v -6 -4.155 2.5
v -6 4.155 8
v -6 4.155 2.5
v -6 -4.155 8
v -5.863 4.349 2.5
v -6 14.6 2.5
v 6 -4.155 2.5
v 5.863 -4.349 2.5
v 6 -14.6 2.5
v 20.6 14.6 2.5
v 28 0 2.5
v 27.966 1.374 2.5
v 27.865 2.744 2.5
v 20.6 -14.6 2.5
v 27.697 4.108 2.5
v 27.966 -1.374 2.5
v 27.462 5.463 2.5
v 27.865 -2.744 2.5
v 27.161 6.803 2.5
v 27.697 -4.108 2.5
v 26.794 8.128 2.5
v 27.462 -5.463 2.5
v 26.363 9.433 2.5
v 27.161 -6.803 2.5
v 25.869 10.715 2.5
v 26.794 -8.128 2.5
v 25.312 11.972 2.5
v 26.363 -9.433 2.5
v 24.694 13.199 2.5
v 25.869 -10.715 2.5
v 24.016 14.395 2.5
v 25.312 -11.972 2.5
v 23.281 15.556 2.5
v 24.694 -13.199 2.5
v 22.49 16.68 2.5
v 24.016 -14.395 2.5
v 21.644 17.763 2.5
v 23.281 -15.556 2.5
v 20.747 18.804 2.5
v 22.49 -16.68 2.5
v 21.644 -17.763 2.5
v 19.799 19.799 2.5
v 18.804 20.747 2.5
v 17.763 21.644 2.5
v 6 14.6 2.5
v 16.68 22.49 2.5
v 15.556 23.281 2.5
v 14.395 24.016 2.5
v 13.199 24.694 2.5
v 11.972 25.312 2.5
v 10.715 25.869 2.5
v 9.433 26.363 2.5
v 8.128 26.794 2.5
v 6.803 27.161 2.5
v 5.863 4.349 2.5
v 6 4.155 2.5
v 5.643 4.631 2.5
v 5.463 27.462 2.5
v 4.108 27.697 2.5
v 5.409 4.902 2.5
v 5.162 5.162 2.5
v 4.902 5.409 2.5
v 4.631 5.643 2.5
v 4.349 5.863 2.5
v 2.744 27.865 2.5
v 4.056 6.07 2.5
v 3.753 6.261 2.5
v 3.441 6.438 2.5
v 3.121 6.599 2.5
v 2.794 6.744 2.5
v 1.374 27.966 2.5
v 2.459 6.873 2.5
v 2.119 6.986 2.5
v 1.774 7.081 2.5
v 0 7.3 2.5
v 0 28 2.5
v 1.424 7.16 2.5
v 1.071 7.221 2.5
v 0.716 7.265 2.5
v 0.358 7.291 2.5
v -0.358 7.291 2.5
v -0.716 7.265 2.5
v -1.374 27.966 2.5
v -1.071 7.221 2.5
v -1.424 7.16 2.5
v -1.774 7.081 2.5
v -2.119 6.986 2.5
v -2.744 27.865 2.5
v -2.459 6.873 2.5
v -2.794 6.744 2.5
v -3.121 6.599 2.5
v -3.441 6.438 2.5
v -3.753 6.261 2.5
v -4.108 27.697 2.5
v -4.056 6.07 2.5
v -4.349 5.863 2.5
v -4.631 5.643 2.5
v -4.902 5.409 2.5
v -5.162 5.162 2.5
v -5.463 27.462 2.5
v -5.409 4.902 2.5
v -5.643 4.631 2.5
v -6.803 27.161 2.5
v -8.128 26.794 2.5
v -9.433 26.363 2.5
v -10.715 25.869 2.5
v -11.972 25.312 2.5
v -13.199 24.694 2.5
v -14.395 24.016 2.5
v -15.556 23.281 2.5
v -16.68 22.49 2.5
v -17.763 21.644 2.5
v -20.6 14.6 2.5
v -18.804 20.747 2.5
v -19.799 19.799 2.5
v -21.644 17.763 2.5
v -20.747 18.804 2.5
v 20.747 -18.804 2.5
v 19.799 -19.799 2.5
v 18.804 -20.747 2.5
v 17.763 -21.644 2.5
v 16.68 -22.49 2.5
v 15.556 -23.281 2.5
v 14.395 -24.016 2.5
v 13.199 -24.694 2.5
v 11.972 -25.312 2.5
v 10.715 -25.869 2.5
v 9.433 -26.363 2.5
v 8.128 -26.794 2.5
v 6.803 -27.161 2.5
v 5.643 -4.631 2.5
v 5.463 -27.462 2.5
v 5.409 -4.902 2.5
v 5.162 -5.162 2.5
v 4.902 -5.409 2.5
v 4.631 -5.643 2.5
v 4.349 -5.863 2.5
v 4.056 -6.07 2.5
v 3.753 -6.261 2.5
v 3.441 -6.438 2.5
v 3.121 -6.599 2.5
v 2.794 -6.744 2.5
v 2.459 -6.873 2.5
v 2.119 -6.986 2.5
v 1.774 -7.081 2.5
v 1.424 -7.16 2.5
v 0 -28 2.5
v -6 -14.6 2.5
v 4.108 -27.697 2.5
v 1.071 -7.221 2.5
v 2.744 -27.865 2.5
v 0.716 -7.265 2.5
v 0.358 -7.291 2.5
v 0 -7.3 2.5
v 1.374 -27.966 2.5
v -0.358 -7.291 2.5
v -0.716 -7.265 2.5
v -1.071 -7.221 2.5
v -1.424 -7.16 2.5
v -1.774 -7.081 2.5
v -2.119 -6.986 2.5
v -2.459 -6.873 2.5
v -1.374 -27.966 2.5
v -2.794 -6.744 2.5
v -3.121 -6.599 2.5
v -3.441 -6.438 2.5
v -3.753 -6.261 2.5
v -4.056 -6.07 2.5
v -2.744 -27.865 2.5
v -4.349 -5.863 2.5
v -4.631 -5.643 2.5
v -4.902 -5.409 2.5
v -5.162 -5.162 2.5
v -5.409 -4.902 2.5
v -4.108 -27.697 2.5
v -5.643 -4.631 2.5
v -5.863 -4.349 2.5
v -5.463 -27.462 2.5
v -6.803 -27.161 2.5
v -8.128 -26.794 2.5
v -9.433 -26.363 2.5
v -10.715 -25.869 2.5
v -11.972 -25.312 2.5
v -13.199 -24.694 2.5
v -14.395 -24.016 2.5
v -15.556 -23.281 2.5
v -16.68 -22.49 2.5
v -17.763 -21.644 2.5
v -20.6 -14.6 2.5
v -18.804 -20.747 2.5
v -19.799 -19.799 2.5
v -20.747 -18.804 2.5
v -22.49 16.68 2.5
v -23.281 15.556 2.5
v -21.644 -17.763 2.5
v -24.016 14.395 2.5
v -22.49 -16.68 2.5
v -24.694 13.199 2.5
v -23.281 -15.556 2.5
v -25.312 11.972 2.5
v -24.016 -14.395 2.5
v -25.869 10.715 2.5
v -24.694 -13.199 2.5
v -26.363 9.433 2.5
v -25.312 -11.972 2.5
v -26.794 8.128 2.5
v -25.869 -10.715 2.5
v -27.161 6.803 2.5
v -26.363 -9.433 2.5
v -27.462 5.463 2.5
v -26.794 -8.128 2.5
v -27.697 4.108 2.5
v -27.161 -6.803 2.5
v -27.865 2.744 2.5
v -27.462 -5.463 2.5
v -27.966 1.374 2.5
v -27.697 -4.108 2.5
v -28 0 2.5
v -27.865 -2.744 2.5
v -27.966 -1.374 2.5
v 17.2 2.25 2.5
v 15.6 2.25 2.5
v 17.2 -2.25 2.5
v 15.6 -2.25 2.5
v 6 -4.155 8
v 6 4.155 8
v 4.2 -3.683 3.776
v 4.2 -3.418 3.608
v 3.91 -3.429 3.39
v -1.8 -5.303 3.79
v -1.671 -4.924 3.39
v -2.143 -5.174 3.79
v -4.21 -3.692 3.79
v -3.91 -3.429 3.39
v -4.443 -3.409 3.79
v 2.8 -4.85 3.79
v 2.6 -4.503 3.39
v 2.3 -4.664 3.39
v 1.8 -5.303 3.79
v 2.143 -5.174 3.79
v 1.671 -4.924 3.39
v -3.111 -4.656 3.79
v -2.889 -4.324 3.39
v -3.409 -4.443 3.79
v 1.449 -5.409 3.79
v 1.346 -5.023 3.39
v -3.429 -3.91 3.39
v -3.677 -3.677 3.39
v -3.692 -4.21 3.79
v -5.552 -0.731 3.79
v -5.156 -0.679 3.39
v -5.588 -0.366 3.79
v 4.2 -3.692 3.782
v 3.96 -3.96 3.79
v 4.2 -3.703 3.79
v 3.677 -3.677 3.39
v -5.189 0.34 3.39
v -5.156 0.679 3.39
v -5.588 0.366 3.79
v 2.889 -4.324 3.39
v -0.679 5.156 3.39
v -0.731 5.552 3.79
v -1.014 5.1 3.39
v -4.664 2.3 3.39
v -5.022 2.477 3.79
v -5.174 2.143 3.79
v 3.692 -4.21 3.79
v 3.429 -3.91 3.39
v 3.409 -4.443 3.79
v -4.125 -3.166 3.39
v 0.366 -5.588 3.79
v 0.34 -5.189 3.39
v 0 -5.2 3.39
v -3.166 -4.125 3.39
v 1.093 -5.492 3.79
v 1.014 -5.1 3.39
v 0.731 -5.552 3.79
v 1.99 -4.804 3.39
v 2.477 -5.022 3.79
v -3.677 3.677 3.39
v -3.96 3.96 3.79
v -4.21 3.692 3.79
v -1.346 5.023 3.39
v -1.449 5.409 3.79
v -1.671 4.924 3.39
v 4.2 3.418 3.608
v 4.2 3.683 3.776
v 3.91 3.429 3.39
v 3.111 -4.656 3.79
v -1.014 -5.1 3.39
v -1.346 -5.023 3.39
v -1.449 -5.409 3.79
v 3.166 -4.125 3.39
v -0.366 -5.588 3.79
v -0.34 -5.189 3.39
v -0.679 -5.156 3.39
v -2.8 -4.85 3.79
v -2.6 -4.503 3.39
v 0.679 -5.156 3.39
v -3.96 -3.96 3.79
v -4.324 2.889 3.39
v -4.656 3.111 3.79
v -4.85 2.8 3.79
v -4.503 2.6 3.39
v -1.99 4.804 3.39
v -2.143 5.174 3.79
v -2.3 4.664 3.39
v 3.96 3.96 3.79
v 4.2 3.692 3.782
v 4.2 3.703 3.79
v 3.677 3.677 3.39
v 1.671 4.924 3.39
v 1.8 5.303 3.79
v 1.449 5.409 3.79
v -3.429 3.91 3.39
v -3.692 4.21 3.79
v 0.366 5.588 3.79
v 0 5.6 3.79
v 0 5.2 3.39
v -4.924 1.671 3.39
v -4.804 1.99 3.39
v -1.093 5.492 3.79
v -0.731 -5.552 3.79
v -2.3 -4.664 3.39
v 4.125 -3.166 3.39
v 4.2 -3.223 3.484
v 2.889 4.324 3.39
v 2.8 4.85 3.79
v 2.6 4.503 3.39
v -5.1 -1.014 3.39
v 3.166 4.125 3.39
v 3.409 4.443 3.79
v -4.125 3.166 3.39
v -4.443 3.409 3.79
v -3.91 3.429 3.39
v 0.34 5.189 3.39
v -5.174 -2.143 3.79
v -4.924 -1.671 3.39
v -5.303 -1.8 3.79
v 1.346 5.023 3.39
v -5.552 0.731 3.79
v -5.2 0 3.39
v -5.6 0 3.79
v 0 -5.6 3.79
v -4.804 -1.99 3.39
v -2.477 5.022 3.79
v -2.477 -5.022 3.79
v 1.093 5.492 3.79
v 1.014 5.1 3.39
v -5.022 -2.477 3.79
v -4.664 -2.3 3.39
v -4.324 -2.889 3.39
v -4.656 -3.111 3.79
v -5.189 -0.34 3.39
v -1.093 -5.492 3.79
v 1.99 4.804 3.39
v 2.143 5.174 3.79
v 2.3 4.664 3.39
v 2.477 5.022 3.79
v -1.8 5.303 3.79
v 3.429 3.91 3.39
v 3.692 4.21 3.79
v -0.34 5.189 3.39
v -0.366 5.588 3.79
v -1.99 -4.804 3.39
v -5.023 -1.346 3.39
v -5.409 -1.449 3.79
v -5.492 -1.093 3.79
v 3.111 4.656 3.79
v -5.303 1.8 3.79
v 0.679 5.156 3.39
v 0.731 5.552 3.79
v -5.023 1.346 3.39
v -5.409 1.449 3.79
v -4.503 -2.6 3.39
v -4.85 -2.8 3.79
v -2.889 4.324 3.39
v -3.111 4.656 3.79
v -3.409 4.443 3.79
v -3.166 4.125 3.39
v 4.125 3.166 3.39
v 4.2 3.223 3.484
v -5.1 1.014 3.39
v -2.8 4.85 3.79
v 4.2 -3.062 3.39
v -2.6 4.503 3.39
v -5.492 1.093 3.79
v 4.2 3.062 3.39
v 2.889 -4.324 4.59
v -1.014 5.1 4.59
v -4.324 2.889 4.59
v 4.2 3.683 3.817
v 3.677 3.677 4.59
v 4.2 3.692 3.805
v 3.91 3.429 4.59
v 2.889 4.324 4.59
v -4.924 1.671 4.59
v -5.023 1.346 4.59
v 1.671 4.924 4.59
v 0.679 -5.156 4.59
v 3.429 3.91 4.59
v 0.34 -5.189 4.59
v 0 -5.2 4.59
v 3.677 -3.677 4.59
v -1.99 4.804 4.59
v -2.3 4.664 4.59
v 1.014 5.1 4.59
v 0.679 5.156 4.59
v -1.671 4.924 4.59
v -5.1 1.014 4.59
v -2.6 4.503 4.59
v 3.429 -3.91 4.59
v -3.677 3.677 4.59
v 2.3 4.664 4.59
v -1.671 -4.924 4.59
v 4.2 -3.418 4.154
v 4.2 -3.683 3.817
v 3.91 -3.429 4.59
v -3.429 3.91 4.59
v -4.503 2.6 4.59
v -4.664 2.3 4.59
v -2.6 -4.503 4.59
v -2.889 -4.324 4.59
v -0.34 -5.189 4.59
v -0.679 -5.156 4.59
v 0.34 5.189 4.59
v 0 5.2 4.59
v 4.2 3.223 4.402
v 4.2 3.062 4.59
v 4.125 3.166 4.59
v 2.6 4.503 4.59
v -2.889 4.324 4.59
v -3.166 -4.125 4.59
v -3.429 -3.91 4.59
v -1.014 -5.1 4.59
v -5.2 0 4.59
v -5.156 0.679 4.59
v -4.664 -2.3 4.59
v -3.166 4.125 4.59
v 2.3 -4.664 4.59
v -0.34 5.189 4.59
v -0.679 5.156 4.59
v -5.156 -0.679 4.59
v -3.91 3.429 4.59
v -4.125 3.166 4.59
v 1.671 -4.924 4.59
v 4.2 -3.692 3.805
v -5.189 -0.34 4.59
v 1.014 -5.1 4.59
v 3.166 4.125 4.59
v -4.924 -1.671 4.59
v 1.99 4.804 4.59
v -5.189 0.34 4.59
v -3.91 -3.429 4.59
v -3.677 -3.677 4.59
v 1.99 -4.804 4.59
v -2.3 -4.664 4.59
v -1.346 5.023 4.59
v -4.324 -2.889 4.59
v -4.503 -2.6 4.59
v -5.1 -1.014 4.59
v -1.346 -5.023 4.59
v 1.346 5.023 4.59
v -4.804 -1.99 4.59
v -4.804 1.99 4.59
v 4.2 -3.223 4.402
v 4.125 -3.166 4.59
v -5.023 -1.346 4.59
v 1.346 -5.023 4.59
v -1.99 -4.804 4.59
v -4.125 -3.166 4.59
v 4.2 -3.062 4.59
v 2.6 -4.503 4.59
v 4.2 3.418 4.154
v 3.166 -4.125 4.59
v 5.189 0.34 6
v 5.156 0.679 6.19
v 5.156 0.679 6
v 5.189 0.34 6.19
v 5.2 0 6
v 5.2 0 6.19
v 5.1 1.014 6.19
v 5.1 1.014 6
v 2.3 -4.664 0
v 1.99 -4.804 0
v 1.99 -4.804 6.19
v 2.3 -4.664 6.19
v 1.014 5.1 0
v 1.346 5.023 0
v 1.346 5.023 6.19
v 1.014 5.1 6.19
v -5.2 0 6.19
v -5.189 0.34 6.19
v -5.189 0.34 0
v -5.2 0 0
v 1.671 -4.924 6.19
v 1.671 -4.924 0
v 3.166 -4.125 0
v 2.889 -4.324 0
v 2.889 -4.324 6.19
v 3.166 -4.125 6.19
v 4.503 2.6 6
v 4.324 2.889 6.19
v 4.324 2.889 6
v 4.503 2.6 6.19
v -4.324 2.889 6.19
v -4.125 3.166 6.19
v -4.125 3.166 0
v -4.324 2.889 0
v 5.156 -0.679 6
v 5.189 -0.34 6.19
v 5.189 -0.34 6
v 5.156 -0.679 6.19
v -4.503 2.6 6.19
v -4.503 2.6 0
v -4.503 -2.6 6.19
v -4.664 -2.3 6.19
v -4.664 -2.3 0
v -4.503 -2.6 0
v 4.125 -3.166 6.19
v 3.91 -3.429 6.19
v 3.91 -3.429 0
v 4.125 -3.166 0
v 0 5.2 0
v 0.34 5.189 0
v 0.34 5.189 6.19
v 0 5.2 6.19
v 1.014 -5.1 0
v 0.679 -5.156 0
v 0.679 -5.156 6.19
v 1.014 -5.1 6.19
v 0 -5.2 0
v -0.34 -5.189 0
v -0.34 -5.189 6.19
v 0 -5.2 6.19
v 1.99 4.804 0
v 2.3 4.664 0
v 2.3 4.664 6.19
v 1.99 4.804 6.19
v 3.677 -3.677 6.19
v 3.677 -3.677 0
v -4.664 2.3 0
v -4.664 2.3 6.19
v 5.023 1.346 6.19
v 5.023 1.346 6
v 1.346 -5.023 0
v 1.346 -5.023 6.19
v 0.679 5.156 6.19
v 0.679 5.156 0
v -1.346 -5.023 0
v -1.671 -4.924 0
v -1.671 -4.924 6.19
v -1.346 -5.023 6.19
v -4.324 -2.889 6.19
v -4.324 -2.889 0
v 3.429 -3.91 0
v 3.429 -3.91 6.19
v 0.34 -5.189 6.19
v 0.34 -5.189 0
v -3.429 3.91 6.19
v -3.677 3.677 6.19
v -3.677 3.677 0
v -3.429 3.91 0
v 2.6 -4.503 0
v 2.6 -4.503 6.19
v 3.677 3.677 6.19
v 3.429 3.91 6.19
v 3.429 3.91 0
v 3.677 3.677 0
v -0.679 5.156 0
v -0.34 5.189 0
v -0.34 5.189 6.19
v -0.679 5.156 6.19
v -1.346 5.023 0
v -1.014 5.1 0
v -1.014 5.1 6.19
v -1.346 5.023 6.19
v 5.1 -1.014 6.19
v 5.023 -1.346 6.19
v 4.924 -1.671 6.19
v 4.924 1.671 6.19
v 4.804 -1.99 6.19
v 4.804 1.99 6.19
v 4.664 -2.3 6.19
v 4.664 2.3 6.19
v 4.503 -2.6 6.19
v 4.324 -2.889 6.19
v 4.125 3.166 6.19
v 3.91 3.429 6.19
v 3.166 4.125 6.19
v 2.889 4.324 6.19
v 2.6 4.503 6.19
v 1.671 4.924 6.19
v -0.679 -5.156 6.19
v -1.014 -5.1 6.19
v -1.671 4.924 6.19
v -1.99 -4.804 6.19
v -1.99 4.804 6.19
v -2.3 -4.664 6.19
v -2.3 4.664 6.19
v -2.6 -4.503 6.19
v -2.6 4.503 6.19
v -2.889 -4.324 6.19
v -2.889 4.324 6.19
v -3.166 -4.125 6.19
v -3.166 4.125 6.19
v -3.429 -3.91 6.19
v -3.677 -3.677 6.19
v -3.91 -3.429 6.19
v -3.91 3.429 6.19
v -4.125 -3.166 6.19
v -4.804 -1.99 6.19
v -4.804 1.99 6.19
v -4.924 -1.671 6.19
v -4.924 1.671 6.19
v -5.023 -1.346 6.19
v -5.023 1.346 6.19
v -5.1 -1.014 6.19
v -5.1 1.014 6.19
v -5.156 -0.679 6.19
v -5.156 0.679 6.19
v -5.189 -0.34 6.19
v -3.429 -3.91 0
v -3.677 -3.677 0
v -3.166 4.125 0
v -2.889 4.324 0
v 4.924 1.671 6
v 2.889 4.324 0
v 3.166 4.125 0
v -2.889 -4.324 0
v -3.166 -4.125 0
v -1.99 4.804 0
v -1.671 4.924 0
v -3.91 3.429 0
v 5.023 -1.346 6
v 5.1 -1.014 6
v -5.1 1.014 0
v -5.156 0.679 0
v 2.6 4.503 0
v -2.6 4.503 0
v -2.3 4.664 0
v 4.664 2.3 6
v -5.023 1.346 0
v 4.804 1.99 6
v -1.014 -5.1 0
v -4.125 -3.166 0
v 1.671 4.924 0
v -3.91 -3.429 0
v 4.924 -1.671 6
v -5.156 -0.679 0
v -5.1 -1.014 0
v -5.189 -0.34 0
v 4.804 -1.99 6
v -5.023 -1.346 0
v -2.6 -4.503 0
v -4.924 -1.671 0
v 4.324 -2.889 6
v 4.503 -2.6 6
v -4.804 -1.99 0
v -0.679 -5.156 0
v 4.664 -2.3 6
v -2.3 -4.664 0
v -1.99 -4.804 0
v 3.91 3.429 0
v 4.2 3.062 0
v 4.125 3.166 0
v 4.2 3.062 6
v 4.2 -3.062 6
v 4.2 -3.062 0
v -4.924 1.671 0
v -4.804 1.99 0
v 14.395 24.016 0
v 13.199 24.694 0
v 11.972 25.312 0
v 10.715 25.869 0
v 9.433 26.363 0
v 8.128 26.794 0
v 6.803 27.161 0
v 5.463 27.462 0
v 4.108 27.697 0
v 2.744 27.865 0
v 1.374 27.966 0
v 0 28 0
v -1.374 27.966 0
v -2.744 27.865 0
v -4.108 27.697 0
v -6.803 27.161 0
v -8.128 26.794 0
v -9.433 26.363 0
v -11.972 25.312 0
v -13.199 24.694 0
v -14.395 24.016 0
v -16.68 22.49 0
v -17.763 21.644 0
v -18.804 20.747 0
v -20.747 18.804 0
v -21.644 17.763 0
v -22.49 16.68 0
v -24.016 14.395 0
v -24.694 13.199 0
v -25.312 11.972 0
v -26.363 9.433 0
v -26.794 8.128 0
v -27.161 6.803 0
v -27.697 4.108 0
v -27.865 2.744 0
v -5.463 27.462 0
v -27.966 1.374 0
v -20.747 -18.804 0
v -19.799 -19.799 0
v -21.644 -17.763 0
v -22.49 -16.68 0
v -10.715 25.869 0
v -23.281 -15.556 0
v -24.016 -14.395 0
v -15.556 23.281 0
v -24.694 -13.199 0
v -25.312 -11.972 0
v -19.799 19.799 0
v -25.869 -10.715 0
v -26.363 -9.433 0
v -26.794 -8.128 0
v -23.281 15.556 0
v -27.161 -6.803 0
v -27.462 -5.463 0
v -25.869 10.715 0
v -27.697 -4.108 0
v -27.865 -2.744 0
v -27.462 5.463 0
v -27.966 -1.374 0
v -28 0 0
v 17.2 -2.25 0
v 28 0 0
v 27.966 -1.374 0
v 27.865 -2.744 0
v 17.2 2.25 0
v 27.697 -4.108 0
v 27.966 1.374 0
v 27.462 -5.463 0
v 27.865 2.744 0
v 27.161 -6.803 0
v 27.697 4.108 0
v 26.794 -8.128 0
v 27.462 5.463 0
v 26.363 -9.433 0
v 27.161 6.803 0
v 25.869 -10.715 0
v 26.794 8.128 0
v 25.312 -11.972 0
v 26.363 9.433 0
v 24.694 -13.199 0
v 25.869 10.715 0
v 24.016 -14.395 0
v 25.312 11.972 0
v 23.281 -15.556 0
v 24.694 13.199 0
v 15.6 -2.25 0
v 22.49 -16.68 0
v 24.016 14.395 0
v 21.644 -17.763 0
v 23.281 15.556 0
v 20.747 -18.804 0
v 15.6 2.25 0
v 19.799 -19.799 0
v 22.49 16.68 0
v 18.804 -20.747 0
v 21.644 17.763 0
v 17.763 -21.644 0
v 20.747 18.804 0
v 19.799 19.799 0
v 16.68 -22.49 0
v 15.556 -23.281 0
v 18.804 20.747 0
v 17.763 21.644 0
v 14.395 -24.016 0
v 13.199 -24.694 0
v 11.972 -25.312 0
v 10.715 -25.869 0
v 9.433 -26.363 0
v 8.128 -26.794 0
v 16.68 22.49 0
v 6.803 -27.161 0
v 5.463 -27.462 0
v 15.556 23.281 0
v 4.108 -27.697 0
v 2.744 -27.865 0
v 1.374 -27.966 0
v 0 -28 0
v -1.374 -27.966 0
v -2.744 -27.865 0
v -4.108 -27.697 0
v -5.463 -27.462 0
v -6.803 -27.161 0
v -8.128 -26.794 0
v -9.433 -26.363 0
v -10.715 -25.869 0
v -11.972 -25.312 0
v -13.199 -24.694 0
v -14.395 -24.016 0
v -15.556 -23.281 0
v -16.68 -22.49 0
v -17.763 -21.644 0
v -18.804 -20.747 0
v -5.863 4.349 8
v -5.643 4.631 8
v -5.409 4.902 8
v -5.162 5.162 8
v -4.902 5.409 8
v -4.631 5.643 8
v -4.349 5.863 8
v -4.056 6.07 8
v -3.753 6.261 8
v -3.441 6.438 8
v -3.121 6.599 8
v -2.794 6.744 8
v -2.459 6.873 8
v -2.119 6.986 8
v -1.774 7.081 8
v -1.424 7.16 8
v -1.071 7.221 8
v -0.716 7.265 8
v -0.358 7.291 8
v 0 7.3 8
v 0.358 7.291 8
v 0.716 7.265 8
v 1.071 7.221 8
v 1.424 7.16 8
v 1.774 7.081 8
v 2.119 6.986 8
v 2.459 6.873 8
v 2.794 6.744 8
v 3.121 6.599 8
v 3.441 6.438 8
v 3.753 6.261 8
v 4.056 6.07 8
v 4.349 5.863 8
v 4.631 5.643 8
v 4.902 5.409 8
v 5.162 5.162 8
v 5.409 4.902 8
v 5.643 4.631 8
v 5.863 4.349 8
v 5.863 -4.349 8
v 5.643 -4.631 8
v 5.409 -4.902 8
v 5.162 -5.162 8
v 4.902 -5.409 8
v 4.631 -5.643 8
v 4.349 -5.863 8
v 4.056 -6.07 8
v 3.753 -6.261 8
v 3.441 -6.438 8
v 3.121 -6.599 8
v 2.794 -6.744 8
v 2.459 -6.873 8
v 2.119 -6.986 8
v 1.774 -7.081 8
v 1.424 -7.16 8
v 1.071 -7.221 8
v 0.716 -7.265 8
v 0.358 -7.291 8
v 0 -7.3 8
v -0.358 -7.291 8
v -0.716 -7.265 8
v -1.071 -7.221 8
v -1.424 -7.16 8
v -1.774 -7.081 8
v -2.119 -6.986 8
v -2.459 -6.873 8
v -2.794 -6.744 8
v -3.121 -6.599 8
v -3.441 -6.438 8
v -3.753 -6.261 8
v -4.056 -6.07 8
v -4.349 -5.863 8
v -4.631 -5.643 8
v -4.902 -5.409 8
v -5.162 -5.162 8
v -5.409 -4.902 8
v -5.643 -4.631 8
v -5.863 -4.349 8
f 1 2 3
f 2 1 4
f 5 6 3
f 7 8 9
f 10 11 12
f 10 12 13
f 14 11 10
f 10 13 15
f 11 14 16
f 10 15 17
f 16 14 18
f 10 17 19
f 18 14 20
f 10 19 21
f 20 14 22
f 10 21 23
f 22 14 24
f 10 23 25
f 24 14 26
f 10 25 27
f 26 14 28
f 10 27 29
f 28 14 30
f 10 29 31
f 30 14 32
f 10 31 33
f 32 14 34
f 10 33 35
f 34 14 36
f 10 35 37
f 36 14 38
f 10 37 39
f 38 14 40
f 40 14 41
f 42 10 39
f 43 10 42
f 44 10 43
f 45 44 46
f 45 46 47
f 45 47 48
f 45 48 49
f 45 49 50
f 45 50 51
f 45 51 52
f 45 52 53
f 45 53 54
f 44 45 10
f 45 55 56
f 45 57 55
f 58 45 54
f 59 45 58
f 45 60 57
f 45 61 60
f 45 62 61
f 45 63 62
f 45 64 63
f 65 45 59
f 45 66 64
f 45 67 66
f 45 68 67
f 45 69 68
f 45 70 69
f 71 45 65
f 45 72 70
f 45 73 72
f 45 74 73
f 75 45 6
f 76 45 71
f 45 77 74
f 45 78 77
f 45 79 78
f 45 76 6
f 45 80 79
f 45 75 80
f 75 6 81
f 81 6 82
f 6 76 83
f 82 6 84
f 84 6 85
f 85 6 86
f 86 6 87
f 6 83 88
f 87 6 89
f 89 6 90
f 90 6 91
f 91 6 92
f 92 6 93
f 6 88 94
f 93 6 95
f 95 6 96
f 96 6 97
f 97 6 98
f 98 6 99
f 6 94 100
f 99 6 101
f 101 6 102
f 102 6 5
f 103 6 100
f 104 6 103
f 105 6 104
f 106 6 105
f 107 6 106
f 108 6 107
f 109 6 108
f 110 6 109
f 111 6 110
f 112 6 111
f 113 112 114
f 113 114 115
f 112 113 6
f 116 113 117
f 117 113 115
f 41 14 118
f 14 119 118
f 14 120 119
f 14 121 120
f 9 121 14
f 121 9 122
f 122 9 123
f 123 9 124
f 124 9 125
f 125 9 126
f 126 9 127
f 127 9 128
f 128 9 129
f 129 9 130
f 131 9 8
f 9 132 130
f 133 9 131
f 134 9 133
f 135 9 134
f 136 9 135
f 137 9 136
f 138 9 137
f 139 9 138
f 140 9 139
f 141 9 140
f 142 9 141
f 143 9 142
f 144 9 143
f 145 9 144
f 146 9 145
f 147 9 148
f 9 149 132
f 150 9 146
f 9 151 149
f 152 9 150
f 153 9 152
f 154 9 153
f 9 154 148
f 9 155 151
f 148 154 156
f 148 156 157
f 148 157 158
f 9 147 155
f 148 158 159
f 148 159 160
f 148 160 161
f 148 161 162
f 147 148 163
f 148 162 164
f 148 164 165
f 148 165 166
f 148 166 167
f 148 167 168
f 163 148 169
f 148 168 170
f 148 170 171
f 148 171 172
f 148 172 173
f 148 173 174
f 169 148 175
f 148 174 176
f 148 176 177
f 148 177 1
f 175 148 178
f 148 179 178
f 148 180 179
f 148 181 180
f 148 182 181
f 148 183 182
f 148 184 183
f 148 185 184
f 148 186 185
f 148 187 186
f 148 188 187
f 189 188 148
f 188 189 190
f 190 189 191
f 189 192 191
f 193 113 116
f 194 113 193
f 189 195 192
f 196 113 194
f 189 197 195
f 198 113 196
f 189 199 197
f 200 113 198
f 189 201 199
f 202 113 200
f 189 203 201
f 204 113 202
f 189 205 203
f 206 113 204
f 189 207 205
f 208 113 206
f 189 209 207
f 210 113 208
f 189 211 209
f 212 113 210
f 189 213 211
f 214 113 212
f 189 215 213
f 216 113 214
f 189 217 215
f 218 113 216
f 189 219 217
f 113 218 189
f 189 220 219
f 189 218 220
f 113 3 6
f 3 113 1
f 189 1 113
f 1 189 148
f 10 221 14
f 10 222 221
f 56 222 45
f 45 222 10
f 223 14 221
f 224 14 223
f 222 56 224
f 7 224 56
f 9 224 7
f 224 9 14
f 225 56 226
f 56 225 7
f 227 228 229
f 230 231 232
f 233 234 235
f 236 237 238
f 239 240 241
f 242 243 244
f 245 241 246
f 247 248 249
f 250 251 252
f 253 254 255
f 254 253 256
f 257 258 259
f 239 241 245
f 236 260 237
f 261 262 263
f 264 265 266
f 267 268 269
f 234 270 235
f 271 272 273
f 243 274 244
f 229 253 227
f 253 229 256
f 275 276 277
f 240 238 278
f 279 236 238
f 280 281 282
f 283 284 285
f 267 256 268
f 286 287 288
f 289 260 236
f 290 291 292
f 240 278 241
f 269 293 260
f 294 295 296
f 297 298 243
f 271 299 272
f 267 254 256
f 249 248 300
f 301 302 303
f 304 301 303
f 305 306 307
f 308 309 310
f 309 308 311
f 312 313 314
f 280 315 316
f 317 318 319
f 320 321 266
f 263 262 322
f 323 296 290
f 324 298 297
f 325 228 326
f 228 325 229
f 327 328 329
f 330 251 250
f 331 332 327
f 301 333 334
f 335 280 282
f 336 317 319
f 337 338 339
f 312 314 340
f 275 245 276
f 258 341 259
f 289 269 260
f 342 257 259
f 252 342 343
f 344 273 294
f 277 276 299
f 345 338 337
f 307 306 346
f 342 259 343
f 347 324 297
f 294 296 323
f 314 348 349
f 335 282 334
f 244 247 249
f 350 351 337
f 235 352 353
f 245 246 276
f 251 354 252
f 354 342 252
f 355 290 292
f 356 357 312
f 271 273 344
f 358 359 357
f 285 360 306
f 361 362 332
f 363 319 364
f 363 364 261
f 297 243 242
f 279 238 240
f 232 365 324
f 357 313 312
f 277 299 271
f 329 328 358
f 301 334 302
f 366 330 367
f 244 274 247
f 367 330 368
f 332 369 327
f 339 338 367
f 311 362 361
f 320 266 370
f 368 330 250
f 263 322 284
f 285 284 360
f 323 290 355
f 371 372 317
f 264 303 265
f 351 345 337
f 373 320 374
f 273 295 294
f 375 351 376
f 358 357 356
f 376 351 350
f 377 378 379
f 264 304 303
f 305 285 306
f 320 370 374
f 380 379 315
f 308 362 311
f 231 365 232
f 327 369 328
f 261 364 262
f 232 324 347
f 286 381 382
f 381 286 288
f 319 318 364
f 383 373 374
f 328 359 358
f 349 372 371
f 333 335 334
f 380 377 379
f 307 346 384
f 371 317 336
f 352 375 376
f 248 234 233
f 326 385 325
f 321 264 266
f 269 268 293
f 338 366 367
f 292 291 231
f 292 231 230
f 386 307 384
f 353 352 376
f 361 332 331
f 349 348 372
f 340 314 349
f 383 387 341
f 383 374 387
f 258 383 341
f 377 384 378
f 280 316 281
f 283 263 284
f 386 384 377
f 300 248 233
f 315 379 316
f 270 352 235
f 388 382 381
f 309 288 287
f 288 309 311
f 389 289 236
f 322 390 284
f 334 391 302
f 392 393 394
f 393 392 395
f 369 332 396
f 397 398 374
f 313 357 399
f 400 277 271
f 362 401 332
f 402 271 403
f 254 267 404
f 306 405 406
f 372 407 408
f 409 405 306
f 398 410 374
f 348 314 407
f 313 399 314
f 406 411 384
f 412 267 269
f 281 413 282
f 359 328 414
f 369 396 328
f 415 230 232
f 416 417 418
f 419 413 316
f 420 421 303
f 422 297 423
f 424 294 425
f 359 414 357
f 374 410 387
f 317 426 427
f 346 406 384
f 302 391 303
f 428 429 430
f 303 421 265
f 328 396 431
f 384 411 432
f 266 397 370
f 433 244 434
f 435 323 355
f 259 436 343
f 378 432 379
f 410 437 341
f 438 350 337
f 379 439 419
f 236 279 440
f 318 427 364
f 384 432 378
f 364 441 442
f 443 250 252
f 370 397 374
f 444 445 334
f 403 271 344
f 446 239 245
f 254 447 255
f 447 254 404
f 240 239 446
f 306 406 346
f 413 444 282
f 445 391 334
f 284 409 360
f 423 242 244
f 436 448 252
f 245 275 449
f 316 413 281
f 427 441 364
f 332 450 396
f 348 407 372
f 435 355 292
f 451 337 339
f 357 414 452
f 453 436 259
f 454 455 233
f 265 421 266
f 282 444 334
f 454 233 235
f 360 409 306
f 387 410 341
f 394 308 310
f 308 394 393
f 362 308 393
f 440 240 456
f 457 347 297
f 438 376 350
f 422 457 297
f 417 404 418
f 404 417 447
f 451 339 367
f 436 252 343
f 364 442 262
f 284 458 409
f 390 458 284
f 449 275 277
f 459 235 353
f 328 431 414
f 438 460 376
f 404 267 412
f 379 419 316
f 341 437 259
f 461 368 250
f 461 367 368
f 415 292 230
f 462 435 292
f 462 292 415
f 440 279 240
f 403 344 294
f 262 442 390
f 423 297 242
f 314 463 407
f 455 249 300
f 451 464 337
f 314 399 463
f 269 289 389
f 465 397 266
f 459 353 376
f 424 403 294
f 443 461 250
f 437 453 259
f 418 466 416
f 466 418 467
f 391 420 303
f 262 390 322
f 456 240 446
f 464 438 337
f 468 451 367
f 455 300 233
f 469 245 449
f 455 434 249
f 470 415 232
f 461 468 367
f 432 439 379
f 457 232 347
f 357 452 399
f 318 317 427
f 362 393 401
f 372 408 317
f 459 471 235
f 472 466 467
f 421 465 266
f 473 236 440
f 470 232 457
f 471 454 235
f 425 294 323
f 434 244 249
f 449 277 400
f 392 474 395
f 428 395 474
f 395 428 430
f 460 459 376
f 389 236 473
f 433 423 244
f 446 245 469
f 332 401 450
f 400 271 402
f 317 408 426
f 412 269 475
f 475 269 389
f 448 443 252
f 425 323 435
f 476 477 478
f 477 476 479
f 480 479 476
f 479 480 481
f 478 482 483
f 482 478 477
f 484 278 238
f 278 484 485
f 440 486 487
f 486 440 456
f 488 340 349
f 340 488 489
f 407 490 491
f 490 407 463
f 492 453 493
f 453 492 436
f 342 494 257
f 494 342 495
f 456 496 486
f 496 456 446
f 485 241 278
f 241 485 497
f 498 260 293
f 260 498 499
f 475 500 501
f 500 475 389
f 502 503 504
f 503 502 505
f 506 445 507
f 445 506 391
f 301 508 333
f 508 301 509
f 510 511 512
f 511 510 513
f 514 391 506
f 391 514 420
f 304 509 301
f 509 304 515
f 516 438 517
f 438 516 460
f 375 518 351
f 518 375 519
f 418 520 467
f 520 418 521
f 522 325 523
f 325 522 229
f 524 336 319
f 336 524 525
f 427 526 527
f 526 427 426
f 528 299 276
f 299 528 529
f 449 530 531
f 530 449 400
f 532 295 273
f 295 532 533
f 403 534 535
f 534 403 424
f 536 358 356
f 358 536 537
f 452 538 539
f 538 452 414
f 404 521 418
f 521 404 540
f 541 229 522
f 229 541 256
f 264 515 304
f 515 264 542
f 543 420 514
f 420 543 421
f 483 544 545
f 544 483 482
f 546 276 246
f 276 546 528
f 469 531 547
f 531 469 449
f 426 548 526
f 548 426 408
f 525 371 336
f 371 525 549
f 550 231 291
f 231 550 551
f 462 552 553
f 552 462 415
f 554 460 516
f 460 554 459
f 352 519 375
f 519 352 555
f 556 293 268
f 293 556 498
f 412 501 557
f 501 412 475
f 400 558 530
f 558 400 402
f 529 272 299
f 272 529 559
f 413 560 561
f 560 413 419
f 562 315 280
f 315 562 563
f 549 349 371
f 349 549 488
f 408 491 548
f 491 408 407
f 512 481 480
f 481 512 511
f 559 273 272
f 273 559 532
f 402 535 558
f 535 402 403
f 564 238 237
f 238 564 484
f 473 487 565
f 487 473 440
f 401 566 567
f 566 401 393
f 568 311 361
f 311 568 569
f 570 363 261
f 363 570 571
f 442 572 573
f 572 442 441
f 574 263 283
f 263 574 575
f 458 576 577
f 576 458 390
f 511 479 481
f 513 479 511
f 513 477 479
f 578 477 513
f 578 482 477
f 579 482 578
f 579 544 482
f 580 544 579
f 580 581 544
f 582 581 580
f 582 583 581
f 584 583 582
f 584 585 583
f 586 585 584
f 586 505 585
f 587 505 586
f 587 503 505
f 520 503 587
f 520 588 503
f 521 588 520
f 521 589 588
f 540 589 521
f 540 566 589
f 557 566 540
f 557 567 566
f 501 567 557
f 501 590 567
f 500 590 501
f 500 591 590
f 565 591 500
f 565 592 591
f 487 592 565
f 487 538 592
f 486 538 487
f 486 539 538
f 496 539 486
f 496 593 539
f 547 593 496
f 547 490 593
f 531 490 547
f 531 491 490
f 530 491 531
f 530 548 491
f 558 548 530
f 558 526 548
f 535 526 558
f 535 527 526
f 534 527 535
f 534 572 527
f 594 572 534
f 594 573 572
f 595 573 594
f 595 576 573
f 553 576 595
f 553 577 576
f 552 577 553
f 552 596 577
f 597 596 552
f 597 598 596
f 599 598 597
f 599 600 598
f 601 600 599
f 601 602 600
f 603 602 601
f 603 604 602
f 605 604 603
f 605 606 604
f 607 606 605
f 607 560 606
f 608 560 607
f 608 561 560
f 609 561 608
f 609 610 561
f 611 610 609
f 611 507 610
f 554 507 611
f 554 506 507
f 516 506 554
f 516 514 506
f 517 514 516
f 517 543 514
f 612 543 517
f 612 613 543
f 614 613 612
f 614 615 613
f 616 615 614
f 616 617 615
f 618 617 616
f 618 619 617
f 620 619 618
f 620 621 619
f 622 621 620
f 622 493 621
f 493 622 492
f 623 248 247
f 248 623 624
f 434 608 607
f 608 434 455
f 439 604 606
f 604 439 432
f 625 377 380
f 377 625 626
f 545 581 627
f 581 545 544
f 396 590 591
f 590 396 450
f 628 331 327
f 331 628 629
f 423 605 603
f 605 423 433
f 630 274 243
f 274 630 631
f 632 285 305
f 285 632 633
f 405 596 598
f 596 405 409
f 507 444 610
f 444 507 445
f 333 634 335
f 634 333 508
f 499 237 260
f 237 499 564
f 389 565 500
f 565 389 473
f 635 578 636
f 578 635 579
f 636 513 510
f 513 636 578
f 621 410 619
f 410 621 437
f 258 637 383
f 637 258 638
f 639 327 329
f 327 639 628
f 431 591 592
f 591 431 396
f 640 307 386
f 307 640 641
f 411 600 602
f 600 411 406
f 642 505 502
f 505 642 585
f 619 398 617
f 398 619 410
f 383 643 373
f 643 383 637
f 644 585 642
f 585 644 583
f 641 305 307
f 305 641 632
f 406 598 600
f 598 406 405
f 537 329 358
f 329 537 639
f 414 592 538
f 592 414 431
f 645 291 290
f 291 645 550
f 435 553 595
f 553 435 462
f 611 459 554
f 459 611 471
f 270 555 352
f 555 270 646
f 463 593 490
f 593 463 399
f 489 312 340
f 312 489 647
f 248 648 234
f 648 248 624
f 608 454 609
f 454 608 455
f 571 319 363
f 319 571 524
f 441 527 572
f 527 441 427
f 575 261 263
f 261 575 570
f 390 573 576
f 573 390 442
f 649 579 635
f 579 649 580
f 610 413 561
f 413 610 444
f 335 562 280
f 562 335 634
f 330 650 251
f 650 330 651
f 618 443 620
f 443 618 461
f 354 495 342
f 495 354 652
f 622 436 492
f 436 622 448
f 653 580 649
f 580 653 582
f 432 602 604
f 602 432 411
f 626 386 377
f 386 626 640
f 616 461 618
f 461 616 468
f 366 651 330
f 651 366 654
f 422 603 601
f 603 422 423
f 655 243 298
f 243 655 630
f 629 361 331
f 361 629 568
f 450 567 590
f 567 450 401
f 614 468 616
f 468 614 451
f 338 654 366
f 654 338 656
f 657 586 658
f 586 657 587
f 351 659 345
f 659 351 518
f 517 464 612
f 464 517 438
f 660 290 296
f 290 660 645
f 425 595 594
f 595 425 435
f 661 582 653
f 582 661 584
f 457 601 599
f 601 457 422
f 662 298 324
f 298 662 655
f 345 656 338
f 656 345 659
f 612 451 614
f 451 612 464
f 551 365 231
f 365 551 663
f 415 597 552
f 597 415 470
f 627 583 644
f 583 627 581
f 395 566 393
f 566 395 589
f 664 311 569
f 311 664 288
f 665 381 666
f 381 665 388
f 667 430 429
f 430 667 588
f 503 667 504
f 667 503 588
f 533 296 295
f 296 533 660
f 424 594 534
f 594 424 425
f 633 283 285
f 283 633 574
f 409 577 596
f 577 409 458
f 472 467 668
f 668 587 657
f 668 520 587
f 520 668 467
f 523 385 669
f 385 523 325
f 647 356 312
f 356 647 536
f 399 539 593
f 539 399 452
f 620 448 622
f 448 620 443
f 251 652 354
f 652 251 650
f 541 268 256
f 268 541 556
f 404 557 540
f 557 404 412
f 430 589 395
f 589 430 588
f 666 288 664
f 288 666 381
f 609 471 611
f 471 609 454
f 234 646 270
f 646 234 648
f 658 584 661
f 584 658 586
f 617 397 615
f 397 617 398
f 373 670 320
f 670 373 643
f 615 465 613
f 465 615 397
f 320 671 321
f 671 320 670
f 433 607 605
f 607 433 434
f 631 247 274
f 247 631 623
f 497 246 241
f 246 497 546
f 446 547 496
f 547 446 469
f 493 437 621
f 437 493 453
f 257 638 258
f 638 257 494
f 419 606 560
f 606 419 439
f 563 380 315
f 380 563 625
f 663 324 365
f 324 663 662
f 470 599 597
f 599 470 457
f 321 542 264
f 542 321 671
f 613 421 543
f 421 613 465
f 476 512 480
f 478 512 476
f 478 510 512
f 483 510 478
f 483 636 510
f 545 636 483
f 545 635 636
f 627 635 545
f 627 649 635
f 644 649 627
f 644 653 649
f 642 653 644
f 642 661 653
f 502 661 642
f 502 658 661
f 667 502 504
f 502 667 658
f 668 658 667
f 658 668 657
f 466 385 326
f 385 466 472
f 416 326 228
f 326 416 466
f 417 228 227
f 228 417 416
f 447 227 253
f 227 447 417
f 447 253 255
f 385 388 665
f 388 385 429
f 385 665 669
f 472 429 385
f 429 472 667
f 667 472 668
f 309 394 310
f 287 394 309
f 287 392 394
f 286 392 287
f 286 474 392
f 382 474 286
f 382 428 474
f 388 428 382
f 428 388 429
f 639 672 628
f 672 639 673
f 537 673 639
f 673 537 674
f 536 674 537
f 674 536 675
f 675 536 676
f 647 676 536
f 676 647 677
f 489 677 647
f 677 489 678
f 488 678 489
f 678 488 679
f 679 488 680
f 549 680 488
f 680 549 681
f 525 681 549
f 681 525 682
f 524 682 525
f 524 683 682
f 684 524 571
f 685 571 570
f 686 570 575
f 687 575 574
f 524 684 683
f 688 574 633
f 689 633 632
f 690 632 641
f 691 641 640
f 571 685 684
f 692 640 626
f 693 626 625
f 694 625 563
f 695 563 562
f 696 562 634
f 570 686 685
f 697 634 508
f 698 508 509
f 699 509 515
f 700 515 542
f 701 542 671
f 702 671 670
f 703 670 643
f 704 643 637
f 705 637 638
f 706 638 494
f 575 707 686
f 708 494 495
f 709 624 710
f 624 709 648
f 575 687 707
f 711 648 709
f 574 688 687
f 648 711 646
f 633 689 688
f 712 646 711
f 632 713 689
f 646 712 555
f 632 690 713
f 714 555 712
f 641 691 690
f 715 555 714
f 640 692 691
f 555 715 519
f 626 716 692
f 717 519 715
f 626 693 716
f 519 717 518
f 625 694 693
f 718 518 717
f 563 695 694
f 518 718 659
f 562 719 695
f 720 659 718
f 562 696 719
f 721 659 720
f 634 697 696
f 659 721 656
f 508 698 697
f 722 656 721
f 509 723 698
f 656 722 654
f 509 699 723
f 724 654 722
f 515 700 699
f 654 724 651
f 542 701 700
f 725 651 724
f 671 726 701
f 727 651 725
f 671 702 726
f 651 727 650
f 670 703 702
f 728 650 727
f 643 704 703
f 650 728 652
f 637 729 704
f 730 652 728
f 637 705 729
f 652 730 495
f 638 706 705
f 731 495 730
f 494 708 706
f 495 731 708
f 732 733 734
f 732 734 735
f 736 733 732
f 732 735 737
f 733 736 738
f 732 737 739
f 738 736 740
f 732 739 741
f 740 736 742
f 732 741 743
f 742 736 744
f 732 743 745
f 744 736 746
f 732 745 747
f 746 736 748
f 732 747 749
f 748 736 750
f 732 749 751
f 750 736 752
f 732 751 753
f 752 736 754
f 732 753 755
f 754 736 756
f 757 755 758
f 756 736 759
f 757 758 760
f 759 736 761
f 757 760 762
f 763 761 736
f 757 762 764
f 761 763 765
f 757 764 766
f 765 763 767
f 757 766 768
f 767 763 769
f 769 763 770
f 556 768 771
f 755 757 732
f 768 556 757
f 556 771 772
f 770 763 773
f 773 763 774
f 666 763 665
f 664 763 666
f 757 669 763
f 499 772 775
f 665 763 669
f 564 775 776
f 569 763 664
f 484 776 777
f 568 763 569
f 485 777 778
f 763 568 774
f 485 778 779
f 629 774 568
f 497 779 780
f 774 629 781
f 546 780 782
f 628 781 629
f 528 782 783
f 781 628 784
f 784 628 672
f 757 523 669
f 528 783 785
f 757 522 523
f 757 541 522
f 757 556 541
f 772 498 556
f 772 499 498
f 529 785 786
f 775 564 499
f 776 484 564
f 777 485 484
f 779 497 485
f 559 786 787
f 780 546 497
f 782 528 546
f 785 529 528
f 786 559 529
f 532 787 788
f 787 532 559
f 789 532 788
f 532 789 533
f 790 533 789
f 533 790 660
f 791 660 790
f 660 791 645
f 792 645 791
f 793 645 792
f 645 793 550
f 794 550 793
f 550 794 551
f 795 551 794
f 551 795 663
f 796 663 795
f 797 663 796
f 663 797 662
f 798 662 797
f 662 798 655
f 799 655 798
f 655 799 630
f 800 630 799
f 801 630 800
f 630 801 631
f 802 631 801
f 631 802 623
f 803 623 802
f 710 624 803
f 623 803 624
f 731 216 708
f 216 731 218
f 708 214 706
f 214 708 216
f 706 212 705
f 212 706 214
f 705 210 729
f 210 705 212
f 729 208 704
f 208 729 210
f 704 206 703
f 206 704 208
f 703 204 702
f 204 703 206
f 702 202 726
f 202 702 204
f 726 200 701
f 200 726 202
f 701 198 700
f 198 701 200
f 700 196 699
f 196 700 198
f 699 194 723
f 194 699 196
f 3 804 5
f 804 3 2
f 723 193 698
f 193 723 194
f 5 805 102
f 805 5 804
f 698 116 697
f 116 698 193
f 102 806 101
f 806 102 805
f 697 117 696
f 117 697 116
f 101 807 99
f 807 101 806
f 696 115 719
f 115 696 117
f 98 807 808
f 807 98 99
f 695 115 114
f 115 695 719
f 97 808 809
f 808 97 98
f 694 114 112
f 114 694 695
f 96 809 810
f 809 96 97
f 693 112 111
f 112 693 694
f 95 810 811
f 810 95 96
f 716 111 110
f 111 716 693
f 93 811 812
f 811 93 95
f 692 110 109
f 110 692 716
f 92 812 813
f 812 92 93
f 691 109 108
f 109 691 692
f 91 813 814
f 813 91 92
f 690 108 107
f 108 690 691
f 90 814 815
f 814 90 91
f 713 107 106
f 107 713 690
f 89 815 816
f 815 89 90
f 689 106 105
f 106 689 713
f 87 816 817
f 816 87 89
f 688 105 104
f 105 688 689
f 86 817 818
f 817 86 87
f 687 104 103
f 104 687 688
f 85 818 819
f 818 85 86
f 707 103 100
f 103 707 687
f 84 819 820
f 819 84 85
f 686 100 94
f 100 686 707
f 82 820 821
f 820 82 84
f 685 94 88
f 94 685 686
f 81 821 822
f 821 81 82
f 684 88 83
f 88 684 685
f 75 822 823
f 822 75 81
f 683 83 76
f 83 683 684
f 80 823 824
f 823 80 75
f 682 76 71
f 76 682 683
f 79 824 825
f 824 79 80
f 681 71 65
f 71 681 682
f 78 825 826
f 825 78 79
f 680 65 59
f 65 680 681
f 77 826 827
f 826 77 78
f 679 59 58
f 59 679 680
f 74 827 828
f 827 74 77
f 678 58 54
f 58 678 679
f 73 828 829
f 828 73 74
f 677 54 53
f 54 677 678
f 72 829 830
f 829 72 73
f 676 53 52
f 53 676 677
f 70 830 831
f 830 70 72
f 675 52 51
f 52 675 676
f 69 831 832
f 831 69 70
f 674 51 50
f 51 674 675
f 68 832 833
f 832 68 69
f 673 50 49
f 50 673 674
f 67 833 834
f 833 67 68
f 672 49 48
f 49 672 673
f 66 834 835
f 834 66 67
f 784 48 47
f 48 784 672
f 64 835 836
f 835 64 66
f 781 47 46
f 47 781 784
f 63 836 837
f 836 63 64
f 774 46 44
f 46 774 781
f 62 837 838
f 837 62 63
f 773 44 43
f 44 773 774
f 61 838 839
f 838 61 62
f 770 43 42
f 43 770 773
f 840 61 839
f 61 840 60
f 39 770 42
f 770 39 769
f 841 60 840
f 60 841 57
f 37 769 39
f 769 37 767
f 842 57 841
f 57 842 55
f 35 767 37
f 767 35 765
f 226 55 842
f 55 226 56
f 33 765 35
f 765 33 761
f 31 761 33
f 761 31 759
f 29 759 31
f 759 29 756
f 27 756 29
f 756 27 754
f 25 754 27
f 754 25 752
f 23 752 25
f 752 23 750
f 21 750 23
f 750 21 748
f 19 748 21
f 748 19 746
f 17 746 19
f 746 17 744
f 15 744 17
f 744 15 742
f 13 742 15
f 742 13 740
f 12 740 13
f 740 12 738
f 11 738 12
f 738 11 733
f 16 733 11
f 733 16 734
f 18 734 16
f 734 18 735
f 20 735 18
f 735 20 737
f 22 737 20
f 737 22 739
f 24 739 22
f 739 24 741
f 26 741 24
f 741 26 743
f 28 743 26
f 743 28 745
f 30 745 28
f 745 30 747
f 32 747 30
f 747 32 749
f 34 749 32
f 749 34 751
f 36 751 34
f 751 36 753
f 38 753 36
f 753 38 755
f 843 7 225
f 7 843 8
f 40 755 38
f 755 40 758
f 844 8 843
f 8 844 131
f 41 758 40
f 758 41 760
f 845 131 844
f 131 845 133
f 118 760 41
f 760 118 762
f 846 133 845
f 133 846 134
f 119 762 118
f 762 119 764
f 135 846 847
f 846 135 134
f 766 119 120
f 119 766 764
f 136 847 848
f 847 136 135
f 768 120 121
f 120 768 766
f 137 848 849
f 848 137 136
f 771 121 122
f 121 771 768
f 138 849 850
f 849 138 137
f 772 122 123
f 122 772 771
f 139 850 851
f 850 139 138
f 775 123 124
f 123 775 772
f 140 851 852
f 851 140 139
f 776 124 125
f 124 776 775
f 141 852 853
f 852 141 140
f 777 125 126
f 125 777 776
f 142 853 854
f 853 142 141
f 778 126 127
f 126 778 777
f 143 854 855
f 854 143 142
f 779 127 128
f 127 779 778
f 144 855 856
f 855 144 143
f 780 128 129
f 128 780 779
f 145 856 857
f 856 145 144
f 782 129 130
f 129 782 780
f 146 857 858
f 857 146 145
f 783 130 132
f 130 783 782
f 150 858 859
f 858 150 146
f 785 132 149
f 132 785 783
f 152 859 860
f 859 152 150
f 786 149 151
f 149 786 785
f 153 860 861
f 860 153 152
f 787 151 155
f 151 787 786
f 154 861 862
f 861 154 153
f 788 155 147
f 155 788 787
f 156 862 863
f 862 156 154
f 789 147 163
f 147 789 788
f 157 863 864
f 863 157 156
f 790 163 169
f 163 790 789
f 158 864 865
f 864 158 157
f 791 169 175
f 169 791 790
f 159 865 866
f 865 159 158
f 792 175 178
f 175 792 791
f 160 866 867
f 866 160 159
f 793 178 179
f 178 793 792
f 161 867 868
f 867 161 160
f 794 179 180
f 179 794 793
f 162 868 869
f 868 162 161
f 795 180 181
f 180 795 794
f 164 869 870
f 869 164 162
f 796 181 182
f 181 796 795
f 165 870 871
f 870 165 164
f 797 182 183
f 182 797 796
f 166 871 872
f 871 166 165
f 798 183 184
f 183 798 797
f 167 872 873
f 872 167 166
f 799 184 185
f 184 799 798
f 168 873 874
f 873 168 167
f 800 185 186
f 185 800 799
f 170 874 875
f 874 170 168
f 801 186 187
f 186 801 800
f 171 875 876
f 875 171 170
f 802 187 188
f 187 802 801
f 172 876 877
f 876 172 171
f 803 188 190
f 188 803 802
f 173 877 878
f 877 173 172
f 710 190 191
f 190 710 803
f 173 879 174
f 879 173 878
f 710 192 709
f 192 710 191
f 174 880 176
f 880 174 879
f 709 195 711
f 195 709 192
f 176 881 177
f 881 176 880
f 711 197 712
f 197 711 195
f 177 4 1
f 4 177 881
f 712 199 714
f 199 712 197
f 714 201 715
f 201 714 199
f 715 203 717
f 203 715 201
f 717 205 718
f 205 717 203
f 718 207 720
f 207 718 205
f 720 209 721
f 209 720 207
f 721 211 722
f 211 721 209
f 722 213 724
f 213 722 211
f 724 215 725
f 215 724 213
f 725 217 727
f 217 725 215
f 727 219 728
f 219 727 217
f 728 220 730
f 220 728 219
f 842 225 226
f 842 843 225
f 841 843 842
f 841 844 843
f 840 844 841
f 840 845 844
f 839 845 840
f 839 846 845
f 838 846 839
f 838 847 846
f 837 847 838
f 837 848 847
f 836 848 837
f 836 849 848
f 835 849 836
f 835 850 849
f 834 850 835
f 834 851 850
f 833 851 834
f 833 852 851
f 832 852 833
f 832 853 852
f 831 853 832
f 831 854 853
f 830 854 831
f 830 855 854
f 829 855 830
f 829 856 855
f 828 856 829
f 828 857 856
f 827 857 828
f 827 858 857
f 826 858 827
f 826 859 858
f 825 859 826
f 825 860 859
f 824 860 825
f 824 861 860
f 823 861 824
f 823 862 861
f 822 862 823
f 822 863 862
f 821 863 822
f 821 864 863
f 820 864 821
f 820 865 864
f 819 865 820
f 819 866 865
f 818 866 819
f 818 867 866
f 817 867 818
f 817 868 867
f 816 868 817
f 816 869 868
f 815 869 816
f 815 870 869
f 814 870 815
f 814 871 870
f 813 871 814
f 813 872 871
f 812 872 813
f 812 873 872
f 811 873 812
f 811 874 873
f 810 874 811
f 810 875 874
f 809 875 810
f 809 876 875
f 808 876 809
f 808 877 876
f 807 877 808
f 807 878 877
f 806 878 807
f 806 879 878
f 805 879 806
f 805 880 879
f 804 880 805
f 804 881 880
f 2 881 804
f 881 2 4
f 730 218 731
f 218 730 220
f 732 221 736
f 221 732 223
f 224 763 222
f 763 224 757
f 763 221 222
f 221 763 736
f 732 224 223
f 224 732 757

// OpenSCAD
// spool_upper — upper flange and the journal.
//
// PRINT FLANGE-DOWN, as emitted: 2463 mm2 on the bed, and the journal steps
// inward going up, so it needs NO SUPPORT ANYWHERE. This is why the split is at
// the upper flange's underside rather than mid-hub — split at the hub and this
// piece becomes hub-then-flange, which overhangs whichever way up you print it.
include <spool_common.scad>
$fn = 96;
difference() {
    _upper_profile();
    // The crank's flats. Cut from the journal's base upward, past the top face.
    translate([0, 0, JOURNAL_BOT - SPLIT_Z]) _journal_flats(0);
    // The socket must pass THROUGH the bottom face, never stop on it.
    translate([0, 0, -EPS]) _joint_socket();
    _anchor_slot(0, FLANGE_T);
}
